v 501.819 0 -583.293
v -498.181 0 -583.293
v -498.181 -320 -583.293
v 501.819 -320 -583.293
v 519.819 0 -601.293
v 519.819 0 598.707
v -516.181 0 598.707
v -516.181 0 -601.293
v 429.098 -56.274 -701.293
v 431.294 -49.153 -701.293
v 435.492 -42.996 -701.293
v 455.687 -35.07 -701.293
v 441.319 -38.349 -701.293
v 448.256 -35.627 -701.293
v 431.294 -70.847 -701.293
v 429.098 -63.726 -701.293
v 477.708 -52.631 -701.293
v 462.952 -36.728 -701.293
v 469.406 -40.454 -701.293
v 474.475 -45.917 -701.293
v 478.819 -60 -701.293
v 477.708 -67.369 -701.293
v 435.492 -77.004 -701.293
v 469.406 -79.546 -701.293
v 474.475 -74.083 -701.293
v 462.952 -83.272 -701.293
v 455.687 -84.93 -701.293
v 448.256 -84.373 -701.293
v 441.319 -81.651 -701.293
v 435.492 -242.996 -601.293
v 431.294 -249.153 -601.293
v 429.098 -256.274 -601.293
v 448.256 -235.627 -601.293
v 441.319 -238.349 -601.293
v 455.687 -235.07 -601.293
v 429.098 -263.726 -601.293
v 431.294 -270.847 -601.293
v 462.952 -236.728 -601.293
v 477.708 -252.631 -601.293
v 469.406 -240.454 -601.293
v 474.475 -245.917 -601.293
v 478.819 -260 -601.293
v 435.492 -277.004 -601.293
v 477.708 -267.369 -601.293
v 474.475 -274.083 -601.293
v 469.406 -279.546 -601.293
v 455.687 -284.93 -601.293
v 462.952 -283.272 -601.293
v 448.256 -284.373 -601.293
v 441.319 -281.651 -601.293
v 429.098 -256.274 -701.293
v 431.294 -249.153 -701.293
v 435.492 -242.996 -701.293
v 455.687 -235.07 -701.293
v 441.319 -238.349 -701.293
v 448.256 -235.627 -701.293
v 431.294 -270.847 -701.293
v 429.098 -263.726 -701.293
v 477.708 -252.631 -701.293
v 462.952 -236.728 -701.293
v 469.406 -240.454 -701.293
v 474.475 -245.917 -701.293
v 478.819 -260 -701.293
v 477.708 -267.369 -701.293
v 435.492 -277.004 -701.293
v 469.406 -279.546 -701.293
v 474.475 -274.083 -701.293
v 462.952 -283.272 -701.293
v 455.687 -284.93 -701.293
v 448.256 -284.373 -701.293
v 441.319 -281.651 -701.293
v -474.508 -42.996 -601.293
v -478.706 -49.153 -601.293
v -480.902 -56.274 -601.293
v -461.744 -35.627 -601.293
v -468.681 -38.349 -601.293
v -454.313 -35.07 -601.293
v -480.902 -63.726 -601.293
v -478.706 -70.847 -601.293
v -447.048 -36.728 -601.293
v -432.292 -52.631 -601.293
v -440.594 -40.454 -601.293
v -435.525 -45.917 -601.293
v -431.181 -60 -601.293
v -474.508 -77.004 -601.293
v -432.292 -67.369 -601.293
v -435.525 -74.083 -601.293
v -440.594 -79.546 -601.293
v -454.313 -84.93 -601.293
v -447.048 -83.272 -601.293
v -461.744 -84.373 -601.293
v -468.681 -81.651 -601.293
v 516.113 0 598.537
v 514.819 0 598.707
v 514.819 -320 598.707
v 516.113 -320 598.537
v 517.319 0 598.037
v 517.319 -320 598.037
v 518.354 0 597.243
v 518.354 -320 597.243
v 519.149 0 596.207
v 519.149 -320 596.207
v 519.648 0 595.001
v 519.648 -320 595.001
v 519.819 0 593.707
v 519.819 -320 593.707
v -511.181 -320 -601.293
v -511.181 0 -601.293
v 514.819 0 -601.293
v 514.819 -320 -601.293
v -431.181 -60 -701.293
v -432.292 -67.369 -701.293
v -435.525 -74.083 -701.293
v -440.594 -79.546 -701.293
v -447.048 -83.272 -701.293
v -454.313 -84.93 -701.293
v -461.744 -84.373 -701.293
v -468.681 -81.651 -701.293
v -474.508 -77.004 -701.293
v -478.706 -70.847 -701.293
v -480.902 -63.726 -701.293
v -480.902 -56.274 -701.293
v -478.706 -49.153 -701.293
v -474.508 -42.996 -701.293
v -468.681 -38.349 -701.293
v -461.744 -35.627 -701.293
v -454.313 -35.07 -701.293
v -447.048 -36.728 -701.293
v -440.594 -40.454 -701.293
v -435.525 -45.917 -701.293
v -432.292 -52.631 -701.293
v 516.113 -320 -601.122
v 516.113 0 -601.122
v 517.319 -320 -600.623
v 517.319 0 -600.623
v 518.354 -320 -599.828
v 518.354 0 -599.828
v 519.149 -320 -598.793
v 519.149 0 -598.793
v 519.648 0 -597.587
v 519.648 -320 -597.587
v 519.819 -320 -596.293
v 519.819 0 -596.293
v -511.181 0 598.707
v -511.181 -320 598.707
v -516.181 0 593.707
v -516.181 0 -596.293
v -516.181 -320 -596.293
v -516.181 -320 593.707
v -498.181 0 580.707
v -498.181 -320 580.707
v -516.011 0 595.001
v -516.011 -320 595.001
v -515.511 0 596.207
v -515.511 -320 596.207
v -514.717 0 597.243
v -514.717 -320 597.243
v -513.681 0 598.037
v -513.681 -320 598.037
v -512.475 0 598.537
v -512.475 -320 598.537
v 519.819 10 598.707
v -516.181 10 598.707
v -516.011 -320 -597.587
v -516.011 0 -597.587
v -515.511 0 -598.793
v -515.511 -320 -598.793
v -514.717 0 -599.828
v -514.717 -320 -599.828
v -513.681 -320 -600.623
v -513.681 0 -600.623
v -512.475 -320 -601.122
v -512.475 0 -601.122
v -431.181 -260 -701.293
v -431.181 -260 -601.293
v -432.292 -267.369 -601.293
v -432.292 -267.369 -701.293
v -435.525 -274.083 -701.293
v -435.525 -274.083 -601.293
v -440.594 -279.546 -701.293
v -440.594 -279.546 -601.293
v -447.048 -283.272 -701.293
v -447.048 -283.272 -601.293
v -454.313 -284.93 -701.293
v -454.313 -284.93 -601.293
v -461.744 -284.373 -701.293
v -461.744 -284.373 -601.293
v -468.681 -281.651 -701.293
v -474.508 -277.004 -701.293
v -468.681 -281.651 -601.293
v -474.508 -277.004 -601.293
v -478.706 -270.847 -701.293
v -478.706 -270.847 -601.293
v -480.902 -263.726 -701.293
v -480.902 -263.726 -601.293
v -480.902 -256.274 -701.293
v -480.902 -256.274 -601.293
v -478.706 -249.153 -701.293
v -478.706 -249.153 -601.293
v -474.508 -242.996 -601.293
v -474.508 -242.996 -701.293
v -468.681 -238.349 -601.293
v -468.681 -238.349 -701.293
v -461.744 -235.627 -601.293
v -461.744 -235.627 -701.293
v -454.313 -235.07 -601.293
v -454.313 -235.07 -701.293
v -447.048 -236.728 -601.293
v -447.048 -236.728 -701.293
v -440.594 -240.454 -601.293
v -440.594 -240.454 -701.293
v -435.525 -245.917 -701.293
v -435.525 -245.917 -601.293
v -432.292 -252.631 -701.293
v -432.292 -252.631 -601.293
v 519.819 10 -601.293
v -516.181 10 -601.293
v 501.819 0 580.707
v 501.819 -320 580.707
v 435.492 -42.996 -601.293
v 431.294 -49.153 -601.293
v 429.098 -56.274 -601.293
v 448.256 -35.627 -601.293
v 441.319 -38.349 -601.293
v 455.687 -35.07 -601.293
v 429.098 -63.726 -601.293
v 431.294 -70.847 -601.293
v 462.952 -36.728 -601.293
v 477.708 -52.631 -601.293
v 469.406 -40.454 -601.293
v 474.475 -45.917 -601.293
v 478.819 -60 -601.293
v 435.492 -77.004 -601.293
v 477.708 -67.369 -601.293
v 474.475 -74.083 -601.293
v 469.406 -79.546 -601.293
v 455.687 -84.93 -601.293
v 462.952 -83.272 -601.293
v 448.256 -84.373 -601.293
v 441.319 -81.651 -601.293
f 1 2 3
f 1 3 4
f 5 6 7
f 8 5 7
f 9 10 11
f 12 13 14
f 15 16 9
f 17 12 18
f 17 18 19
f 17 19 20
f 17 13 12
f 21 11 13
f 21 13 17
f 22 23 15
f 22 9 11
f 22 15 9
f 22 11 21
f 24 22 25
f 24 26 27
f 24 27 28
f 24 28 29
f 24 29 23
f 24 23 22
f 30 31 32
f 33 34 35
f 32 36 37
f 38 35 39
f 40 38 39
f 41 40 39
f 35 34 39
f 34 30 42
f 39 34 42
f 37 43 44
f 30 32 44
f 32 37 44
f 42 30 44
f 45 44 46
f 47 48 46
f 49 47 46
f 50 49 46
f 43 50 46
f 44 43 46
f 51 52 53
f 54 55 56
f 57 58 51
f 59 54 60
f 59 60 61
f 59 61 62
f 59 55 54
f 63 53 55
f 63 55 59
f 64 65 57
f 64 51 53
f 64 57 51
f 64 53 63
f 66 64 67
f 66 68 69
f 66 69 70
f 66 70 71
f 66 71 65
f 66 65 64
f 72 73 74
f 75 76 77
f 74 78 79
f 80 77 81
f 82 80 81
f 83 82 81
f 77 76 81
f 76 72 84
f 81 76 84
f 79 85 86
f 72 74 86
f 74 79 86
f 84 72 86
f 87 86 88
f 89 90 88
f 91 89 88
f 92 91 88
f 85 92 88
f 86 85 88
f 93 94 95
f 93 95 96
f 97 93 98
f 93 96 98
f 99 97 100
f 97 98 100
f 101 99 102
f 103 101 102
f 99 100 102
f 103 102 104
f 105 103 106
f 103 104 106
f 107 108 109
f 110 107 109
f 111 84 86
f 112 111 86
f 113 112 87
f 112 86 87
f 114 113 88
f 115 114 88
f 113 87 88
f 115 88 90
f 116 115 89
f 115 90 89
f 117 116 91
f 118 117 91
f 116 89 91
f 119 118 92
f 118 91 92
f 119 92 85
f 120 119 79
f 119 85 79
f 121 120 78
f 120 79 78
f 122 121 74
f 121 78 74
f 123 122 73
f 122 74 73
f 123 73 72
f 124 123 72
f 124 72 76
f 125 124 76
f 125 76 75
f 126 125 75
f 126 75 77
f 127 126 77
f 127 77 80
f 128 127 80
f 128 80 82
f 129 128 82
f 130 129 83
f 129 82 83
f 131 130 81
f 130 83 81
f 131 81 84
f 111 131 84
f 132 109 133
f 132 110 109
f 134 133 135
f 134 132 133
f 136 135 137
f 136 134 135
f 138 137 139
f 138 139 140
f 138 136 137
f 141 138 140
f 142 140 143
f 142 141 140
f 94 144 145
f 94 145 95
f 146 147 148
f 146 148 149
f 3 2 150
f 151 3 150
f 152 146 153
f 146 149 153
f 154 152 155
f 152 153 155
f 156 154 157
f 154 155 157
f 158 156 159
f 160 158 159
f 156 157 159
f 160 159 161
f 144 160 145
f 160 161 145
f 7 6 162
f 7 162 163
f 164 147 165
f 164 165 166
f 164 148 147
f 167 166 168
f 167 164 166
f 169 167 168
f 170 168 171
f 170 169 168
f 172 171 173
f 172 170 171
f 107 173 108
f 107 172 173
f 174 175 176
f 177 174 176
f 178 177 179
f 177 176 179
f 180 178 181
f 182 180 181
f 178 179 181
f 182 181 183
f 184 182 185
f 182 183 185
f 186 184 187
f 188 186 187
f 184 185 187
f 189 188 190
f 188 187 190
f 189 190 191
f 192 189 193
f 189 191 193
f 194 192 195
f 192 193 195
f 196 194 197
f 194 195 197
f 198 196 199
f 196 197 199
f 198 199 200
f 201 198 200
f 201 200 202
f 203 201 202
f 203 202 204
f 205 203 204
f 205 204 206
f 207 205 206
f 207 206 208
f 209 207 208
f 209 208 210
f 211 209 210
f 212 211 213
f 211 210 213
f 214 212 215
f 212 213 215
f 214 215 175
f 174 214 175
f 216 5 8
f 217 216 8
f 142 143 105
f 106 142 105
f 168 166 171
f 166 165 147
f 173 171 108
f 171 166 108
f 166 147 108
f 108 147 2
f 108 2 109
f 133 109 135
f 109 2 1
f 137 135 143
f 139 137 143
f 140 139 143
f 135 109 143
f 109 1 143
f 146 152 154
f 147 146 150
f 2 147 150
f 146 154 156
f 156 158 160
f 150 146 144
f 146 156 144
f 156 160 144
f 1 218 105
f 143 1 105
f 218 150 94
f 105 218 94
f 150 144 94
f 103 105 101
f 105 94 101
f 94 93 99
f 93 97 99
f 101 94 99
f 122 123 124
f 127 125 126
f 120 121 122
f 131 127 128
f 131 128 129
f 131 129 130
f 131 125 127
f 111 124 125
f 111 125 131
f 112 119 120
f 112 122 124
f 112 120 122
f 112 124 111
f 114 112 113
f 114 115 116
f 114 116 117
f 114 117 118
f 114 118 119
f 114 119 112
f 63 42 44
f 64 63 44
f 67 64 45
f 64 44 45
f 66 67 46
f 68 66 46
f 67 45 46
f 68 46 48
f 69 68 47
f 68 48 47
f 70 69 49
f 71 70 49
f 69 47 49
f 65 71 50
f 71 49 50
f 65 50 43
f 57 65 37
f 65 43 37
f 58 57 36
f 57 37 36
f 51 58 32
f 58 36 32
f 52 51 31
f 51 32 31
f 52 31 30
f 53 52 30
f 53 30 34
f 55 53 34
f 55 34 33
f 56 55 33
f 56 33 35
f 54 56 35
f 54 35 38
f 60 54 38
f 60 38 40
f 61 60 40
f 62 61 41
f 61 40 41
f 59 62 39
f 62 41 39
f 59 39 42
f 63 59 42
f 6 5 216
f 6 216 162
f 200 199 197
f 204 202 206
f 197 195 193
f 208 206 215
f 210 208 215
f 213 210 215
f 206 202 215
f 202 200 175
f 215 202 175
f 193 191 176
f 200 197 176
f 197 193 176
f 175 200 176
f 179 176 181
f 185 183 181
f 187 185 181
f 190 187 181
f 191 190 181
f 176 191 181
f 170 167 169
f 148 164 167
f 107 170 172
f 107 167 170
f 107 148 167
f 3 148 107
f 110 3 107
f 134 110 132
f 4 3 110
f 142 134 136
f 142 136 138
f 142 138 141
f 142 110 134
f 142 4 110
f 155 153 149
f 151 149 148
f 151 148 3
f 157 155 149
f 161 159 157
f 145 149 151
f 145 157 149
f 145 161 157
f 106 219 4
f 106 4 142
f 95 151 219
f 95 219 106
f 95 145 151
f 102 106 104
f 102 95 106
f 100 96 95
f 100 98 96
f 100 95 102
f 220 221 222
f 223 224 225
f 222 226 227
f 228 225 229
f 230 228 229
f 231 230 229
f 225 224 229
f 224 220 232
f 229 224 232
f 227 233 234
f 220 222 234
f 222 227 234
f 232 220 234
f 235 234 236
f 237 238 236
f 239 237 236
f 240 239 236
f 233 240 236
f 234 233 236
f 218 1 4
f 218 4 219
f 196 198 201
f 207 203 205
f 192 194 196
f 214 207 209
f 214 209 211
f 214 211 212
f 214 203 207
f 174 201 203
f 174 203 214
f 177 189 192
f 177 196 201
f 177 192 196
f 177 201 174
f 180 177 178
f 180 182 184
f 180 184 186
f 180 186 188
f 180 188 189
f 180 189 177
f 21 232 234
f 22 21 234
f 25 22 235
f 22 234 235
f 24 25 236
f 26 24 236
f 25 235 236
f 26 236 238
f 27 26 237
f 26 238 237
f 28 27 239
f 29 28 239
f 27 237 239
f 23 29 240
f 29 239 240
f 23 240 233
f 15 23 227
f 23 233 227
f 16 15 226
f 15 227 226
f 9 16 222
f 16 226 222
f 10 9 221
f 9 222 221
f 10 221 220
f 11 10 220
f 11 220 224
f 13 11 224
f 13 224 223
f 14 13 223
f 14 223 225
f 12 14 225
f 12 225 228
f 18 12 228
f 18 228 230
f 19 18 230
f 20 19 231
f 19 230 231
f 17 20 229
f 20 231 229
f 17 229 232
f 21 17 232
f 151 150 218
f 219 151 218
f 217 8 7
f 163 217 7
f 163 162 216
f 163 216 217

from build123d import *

# Parameters (mm, degrees)
F0_W     = 1036
F0_H     = 1200
F0_W_2   = 1000
F0_H_2   = 1164
F1_DEPTH = 320
F2_W     = 1036
F2_H     = 1200
F3_DEPTH = 10
F4_R     = 25
F5_DEPTH = 100
F6_R     = 5


with BuildPart() as f1:
    # F0 (on Front) → F1 (new body)
    with BuildSketch(Plane.XZ):
        with Locations((1.818649, -1.292639)):
            Rectangle(F0_W, F0_H)
        with Locations((1.818649, -1.292639)):
            Rectangle(F0_W_2, F0_H_2, mode=Mode.SUBTRACT)
    extrude(amount=F1_DEPTH)

    # F6
    f6_edges = [f1.edges().sort_by_distance(p)[0] for p in [
        (-516.181351, -160, 598.707361),
        (-516.181351, -160, -601.292639),
        (519.818649, -160, -601.292639),
        (519.818649, -160, 598.707361),
    ]]
    fillet(f6_edges, radius=F6_R)


with BuildPart() as f3:
    # F2 (on face) → F3 (new body)
    with BuildSketch(Plane(origin=(0, 0, 0), x_dir=(-1, 0, 0), z_dir=(0, 1, 0))):
        with Locations((-1.818649, -1.292639)):
            Rectangle(F2_W, F2_H)
    extrude(amount=F3_DEPTH)


with BuildPart() as f5:
    # F4 (on face) → F5 (new body)
    with BuildSketch(Plane(origin=(0, 0, -601.292639), x_dir=(1, 0, 0), z_dir=(0, 0, -1))):
        with Locations((-456.181351, 260)):
            Circle(F4_R)
        with Locations((-456.181351, 60)):
            Circle(F4_R)
        with Locations((453.818649, 260)):
            Circle(F4_R)
        with Locations((453.818649, 60)):
            Circle(F4_R)
    extrude(amount=F5_DEPTH)


solid = Compound([f1.part, f3.part, f5.part])
